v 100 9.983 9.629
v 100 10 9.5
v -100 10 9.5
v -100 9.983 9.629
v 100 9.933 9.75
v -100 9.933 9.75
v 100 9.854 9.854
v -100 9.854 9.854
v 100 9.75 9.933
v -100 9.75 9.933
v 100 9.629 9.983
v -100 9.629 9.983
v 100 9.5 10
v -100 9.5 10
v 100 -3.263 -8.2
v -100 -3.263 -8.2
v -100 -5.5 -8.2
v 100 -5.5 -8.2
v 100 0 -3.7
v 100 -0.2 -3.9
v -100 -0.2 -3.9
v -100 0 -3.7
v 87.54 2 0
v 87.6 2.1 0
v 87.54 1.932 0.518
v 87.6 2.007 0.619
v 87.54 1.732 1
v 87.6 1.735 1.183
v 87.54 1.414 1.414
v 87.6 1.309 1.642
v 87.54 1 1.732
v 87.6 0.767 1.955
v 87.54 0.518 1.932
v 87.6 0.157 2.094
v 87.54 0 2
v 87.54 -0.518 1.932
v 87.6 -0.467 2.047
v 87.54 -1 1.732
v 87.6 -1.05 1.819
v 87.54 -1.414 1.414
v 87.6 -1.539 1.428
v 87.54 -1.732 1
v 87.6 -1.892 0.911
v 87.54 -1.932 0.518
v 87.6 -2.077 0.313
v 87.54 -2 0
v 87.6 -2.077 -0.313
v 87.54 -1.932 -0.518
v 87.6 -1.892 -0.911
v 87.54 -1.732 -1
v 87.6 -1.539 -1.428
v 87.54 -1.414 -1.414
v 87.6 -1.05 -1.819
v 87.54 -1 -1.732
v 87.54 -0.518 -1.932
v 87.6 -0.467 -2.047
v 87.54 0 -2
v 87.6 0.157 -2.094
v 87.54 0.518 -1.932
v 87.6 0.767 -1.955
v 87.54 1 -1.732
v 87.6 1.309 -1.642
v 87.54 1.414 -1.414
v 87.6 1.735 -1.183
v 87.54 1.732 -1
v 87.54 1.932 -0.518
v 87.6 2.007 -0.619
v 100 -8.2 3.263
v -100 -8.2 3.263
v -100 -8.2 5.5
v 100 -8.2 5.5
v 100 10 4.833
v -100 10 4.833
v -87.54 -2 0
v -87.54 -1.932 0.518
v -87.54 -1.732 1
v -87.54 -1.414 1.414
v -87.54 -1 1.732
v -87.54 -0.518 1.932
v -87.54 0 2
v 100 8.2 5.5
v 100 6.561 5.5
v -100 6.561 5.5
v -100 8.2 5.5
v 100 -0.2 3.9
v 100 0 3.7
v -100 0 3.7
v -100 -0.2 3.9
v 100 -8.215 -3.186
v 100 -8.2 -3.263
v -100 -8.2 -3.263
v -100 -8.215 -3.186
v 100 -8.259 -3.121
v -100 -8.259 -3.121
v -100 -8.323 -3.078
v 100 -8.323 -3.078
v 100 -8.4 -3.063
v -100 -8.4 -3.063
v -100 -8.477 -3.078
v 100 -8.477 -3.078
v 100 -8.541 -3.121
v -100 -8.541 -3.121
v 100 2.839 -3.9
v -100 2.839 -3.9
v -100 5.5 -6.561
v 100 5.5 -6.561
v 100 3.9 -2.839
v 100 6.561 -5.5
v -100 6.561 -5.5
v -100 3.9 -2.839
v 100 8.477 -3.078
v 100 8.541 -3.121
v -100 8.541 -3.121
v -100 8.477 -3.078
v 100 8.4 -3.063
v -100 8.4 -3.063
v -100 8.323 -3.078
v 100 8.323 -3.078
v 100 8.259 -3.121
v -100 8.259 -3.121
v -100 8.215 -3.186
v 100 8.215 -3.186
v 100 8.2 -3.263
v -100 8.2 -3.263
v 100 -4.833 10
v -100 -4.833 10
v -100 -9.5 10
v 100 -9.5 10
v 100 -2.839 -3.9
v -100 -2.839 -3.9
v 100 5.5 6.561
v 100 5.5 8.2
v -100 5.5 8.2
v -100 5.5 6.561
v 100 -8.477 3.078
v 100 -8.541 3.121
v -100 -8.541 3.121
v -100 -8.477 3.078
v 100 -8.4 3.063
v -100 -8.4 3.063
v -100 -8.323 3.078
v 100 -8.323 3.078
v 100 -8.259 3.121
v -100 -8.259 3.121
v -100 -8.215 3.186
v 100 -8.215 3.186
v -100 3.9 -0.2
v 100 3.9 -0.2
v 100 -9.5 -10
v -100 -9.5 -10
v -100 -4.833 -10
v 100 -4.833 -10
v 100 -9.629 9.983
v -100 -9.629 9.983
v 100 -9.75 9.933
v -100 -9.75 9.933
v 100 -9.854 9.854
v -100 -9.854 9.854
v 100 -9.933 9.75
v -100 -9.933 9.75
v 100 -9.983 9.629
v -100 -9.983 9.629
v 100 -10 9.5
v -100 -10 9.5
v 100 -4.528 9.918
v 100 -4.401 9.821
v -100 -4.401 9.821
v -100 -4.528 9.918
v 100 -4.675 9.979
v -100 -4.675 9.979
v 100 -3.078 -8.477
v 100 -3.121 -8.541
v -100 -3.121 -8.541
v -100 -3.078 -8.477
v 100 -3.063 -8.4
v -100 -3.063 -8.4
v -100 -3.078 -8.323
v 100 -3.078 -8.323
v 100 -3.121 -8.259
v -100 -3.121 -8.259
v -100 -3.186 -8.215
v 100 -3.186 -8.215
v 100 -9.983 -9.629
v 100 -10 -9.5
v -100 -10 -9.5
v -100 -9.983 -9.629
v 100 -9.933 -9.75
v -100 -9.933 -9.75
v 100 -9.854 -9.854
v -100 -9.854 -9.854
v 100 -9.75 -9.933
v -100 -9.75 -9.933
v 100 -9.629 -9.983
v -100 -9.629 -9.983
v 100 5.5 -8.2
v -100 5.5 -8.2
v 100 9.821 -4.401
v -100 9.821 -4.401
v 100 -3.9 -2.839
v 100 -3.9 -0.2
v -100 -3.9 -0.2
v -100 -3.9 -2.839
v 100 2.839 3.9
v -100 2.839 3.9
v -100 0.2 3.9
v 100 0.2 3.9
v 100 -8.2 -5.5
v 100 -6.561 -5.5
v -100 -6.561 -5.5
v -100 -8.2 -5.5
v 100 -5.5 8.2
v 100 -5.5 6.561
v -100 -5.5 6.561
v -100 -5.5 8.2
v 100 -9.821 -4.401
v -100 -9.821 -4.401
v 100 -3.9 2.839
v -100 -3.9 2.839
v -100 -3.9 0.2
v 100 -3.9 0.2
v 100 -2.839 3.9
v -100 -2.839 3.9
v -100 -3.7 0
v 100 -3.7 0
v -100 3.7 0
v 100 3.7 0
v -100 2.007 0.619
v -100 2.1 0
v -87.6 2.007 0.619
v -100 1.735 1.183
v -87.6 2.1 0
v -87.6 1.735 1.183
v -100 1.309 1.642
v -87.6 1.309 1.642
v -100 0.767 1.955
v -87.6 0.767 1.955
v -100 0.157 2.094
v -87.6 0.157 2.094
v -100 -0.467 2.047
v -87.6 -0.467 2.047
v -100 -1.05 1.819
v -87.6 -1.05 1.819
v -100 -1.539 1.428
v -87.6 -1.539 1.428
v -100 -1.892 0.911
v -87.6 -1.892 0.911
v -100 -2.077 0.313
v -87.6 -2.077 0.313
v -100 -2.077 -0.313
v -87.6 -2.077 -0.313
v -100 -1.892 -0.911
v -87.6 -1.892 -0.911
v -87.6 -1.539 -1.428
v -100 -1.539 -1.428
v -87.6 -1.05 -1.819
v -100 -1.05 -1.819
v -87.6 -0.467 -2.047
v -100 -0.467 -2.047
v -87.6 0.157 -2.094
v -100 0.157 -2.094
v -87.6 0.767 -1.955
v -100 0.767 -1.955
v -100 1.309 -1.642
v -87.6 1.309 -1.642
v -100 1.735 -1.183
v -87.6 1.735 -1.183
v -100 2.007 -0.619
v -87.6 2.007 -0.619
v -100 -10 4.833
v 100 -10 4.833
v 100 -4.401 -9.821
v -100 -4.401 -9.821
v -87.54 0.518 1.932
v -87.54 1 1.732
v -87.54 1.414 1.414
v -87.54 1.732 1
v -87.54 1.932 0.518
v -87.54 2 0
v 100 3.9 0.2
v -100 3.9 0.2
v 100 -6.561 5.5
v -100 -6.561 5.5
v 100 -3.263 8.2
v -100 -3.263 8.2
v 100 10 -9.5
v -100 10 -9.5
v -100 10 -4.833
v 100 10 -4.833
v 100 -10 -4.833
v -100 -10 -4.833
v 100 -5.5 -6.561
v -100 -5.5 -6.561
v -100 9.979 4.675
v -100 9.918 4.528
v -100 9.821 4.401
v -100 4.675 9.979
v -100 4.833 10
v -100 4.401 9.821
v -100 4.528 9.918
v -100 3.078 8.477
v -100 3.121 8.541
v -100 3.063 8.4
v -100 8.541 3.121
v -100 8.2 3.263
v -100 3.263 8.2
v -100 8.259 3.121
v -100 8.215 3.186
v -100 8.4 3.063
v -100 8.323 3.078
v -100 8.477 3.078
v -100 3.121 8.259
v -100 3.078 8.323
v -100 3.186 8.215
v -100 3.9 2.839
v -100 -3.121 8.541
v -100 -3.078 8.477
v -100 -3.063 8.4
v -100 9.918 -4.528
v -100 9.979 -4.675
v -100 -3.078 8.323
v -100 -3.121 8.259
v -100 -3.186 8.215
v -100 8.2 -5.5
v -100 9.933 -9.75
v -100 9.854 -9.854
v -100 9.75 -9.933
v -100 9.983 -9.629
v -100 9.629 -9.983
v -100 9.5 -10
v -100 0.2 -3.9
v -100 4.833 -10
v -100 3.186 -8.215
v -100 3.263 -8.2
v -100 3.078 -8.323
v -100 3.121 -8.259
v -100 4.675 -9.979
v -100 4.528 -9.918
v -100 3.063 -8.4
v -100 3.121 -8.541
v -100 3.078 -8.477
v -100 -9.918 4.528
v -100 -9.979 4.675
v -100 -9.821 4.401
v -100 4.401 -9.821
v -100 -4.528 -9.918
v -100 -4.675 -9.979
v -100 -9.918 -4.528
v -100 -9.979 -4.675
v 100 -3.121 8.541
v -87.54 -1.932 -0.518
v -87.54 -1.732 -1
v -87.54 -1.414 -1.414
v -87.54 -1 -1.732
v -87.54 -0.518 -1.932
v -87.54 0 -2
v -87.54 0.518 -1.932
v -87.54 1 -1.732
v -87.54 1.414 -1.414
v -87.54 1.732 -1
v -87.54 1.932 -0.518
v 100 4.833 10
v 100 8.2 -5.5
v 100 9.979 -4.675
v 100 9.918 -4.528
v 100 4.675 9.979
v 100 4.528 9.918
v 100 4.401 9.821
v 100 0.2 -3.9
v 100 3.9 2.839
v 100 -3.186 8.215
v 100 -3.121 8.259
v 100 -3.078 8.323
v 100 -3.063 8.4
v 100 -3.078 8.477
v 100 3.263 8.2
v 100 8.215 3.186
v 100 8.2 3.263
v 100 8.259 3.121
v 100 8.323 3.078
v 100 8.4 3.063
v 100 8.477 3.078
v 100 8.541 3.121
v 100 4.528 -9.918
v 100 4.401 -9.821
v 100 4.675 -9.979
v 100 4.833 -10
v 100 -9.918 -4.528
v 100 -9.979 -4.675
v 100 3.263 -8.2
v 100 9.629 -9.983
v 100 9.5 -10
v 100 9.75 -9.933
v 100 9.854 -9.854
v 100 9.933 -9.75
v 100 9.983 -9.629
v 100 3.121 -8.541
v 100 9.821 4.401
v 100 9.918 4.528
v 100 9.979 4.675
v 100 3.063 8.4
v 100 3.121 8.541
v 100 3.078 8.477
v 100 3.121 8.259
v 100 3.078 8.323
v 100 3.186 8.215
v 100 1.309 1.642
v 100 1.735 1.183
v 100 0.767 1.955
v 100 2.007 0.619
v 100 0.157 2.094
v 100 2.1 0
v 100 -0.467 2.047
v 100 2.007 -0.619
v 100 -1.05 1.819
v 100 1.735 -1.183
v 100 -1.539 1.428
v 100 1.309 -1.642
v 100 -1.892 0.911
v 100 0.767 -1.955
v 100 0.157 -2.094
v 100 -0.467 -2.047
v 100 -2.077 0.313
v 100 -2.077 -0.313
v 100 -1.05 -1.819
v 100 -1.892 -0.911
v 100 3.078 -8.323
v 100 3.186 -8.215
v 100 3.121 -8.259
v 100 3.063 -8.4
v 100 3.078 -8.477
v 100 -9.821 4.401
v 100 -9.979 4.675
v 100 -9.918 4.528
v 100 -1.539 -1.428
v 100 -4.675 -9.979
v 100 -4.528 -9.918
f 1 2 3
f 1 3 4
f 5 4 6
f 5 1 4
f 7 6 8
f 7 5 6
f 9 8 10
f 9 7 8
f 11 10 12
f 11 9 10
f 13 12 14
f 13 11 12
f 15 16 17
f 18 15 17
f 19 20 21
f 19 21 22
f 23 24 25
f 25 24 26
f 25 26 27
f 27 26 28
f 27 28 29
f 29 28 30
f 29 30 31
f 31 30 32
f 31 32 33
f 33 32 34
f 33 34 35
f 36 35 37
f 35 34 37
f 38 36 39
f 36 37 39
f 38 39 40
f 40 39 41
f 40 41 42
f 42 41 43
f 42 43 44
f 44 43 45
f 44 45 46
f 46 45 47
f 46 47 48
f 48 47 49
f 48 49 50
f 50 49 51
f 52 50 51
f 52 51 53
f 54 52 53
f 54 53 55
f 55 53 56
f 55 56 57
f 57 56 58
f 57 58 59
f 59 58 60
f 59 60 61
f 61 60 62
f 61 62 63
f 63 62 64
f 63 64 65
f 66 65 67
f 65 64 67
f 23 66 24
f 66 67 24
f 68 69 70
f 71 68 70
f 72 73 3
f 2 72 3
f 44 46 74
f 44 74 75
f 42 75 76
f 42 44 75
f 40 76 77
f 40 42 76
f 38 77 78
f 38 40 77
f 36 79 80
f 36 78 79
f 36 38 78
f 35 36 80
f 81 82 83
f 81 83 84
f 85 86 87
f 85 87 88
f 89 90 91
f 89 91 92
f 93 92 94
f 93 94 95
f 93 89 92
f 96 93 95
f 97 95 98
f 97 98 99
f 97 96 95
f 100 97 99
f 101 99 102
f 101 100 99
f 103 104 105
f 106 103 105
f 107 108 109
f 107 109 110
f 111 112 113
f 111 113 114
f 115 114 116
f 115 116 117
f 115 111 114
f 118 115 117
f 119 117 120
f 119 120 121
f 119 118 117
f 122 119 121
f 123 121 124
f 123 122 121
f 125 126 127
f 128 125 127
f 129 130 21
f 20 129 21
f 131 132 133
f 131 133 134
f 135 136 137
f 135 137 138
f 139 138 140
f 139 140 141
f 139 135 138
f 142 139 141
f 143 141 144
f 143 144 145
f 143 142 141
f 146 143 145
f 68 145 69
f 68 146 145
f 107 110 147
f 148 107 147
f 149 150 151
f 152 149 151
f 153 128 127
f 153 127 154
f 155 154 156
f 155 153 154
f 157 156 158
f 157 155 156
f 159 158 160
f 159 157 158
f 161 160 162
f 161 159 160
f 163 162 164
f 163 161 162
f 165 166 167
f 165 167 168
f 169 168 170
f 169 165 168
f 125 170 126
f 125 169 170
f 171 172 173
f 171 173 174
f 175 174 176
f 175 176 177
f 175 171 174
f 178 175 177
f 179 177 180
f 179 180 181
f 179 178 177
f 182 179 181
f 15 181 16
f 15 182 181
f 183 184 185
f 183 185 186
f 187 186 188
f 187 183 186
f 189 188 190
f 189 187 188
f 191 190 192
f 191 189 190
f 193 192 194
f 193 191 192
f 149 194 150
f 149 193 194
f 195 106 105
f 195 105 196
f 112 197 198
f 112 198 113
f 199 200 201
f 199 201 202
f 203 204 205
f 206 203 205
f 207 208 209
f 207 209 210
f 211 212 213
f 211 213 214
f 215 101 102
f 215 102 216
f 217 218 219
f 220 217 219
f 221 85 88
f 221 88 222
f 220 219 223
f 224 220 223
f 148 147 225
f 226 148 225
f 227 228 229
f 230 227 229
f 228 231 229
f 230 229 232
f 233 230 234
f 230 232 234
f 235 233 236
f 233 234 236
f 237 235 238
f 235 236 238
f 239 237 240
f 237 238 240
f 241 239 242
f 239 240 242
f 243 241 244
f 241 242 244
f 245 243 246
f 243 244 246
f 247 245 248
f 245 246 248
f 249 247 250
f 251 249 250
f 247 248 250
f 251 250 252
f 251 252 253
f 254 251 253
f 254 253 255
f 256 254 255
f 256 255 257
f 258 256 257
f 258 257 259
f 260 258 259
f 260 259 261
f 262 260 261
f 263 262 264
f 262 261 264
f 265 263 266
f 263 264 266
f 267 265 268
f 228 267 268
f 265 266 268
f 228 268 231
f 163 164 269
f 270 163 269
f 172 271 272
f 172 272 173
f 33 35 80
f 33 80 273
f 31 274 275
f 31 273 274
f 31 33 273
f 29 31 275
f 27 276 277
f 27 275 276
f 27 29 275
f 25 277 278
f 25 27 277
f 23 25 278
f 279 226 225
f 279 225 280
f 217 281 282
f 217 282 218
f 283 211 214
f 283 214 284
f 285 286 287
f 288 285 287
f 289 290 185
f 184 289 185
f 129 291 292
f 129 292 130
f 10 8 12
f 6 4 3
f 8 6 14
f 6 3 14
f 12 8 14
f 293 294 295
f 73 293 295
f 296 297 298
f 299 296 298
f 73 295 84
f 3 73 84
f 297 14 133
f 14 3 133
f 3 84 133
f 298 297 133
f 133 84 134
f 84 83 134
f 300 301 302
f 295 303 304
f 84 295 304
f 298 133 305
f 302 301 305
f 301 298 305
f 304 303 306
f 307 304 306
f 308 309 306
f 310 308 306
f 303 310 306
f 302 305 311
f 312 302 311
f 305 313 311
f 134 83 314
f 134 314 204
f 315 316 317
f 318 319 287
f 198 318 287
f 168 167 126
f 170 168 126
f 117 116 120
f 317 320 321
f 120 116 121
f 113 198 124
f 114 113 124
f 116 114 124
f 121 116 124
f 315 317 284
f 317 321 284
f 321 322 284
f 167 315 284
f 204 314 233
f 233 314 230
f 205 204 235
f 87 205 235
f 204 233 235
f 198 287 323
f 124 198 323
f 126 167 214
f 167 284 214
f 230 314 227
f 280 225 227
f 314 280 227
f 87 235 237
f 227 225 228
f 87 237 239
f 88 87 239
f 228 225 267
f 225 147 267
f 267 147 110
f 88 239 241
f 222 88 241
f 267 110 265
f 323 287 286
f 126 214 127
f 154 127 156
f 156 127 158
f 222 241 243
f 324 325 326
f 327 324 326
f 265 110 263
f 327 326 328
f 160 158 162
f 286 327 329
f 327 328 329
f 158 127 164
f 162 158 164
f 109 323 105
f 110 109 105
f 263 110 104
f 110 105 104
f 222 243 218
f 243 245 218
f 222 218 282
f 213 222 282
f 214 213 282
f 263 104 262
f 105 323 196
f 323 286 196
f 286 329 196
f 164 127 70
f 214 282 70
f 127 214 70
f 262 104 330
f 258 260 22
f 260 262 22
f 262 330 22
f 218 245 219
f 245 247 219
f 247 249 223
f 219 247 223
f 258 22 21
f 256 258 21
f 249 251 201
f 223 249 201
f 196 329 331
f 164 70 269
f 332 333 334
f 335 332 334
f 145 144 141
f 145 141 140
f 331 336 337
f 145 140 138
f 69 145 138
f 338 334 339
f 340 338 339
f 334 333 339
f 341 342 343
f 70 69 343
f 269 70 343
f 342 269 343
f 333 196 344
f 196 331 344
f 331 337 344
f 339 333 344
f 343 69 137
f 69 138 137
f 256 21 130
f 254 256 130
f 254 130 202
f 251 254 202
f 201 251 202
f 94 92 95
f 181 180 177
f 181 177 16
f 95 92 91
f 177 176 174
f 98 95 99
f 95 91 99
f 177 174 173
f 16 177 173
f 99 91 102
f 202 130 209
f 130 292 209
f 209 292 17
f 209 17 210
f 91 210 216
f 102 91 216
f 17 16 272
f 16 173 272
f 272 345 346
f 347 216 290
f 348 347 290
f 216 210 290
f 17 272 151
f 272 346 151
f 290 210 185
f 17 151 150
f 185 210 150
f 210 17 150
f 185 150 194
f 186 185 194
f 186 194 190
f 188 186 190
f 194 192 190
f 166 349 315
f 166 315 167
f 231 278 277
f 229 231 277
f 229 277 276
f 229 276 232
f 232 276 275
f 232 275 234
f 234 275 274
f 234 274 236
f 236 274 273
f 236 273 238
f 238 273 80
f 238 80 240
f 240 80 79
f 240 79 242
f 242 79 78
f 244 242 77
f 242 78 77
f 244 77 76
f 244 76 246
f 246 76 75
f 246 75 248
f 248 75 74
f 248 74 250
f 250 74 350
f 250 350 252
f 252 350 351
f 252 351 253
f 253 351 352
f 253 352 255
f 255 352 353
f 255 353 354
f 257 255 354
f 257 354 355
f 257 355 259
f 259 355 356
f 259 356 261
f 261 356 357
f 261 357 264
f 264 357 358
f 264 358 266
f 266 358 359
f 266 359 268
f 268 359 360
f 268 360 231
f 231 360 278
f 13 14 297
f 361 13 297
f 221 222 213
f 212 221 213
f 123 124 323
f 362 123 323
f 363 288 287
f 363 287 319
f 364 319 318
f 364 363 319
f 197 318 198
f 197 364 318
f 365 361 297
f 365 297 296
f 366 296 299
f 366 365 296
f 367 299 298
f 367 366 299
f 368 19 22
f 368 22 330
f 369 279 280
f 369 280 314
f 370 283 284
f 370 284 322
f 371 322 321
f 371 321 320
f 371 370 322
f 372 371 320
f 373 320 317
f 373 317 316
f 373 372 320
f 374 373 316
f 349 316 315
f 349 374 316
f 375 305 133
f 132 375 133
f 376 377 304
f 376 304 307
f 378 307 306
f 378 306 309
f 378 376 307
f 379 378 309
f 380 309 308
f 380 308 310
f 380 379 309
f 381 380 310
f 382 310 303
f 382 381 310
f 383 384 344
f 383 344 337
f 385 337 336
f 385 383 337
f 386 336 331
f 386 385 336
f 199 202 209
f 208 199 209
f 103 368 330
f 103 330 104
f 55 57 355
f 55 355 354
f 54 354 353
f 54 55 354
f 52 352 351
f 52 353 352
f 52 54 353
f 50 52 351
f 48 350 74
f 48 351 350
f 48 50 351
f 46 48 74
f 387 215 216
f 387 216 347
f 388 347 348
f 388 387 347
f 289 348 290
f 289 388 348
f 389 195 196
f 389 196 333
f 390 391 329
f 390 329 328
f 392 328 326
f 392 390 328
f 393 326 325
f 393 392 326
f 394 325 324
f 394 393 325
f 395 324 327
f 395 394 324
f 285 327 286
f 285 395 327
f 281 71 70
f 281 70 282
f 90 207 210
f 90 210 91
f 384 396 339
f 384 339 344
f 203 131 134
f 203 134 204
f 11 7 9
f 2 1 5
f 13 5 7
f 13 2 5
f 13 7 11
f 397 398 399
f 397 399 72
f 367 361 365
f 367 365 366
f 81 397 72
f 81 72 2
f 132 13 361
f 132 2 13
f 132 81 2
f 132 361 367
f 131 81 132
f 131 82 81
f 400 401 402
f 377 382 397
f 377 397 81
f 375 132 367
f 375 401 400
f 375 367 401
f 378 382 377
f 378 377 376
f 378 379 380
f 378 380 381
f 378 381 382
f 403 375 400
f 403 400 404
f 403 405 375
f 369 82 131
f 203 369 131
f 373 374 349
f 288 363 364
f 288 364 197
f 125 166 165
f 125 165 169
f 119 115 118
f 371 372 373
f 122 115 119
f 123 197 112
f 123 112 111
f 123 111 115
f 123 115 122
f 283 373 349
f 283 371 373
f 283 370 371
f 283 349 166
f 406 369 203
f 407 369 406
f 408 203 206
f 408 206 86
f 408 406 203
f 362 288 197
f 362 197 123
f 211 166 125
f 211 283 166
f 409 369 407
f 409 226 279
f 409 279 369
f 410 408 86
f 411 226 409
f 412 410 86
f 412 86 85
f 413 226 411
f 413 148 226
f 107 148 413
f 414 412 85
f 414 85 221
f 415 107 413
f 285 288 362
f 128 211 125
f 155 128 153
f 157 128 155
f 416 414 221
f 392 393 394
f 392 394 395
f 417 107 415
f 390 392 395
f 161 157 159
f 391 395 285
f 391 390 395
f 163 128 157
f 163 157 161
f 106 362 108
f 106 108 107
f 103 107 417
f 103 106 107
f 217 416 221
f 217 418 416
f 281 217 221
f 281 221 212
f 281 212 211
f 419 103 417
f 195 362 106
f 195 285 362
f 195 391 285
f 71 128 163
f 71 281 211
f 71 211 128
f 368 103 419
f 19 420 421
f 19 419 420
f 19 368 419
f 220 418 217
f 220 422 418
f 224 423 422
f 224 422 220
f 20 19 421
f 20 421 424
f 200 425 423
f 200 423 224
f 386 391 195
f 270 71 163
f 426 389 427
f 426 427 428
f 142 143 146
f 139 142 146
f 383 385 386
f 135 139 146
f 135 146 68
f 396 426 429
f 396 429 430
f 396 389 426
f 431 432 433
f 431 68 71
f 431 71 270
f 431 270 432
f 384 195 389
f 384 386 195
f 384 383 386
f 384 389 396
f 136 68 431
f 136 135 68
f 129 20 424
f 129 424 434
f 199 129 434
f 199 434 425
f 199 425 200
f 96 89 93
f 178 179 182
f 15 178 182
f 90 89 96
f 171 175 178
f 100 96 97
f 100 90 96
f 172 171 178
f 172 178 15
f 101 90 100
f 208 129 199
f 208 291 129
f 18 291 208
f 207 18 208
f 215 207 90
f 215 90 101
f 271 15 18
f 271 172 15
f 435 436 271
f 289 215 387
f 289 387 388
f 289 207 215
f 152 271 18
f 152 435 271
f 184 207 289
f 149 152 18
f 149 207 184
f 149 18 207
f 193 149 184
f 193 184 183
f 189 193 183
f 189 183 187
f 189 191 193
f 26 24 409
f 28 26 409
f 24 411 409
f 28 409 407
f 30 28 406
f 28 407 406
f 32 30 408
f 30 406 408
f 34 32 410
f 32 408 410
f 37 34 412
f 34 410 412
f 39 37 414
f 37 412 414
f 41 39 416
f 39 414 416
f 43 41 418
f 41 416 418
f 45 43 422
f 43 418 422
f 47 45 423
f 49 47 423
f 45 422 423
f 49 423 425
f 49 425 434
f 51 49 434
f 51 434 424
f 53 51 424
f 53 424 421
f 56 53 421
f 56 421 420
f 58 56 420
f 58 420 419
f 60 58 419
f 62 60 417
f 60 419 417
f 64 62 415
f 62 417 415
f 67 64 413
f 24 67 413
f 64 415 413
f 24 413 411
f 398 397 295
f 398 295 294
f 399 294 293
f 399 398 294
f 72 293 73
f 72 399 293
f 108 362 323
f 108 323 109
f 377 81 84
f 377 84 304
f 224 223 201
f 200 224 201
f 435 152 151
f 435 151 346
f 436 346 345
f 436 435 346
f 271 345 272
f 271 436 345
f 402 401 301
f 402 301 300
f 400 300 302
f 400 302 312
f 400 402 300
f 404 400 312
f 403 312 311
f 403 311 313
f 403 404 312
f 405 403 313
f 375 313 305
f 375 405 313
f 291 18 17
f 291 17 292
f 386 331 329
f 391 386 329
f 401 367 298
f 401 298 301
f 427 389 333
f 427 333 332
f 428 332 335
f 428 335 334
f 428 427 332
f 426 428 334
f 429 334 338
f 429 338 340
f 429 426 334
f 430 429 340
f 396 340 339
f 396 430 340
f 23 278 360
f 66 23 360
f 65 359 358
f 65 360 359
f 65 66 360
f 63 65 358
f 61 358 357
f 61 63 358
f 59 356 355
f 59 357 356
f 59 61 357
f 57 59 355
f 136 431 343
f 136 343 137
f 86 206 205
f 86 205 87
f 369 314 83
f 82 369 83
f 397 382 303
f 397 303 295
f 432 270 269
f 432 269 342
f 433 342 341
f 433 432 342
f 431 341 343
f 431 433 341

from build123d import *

# Parameters (mm, degrees)
BOSS_EXTRUDE1_DEPTH = 100
CIRPATTERN1_COUNT   = 4


# Read off the part's stored shape, not the designer's step: M5 Tapped Hole1
with BuildPart() as part:
    # Sketch1 → Boss-Extrude1 (new, symmetric)
    with BuildSketch(Plane(origin=(0, 0, 0), x_dir=(0, 0, -1), z_dir=(1, 0, 0))):
        with BuildLine():
            Line((0, 2), (0, 3.7))
            Line((0, 3.7), (-0.2, 3.9))
            Line((-0.2, 3.9), (-2.839339827, 3.9))
            Line((-2.839339827, 3.9), (-5.5, 6.560660173))
            Line((-5.5, 6.560660173), (-5.5, 8.2))
            Line((-5.5, 8.2), (-3.262842712, 8.2))
            ThreePointArc((-3.262842712, 8.2), (-3.078066806, 8.323463314), (-3.121421356, 8.541421356))
            Line((-3.121421356, 8.541421356), (-4.401335137, 9.821335137))
            ThreePointArc((-4.401335137, 9.821335137), (-4.599233379, 9.953566515), (-4.832670273, 10))
            Line((-4.832670273, 10), (-9.5, 10))
            ThreePointArc((-9.5, 10), (-9.853553391, 9.853553391), (-10, 9.5))
            Line((-10, 9.5), (-10, 4.832670273))
            ThreePointArc((-10, 4.832670273), (-9.953566515, 4.599233379), (-9.821335137, 4.401335137))
            Line((-9.821335137, 4.401335137), (-8.541421356, 3.121421356))
            ThreePointArc((-8.541421356, 3.121421356), (-8.323463314, 3.078066806), (-8.2, 3.262842712))
            Line((-8.2, 3.262842712), (-8.2, 5.5))
            Line((-8.2, 5.5), (-6.560660173, 5.5))
            Line((-6.560660173, 5.5), (-3.9, 2.839339827))
            Line((-3.9, 2.839339827), (-3.9, 0.2))
            Line((-3.9, 0.2), (-3.7, 0))
            Line((-3.7, 0), (-2, 0))
            ThreePointArc((-2, 0), (-1.414213562, 1.414213562), (0, 2))
        make_face()
    boss_extrude1 = extrude(amount=BOSS_EXTRUDE1_DEPTH, both=True)

    # CirPattern1: Boss-Extrude1 ×4 about axis
    cirpattern1_axis = Axis((0, 0, 0), (1, 0, 0))
    for i in range(1, CIRPATTERN1_COUNT):
        add(boss_extrude1.rotate(cirpattern1_axis, i * 360 / CIRPATTERN1_COUNT))

    # M5 Tapped Hole1 outline → M5 Tapped Hole1 (revolve, cut)
    with BuildSketch(Plane.YX):
        Polygon((2.1, -87.6), (2, -87.539913938), (2, -100), (2.1, -100), align=None)
        Polygon((2, 100), (2, 87.539913938), (2.1, 87.6), (2.1, 100), align=None)
    revolve(axis=Axis((0, 0, 0), (1, 0, 0)), mode=Mode.SUBTRACT)


solid = part.part
